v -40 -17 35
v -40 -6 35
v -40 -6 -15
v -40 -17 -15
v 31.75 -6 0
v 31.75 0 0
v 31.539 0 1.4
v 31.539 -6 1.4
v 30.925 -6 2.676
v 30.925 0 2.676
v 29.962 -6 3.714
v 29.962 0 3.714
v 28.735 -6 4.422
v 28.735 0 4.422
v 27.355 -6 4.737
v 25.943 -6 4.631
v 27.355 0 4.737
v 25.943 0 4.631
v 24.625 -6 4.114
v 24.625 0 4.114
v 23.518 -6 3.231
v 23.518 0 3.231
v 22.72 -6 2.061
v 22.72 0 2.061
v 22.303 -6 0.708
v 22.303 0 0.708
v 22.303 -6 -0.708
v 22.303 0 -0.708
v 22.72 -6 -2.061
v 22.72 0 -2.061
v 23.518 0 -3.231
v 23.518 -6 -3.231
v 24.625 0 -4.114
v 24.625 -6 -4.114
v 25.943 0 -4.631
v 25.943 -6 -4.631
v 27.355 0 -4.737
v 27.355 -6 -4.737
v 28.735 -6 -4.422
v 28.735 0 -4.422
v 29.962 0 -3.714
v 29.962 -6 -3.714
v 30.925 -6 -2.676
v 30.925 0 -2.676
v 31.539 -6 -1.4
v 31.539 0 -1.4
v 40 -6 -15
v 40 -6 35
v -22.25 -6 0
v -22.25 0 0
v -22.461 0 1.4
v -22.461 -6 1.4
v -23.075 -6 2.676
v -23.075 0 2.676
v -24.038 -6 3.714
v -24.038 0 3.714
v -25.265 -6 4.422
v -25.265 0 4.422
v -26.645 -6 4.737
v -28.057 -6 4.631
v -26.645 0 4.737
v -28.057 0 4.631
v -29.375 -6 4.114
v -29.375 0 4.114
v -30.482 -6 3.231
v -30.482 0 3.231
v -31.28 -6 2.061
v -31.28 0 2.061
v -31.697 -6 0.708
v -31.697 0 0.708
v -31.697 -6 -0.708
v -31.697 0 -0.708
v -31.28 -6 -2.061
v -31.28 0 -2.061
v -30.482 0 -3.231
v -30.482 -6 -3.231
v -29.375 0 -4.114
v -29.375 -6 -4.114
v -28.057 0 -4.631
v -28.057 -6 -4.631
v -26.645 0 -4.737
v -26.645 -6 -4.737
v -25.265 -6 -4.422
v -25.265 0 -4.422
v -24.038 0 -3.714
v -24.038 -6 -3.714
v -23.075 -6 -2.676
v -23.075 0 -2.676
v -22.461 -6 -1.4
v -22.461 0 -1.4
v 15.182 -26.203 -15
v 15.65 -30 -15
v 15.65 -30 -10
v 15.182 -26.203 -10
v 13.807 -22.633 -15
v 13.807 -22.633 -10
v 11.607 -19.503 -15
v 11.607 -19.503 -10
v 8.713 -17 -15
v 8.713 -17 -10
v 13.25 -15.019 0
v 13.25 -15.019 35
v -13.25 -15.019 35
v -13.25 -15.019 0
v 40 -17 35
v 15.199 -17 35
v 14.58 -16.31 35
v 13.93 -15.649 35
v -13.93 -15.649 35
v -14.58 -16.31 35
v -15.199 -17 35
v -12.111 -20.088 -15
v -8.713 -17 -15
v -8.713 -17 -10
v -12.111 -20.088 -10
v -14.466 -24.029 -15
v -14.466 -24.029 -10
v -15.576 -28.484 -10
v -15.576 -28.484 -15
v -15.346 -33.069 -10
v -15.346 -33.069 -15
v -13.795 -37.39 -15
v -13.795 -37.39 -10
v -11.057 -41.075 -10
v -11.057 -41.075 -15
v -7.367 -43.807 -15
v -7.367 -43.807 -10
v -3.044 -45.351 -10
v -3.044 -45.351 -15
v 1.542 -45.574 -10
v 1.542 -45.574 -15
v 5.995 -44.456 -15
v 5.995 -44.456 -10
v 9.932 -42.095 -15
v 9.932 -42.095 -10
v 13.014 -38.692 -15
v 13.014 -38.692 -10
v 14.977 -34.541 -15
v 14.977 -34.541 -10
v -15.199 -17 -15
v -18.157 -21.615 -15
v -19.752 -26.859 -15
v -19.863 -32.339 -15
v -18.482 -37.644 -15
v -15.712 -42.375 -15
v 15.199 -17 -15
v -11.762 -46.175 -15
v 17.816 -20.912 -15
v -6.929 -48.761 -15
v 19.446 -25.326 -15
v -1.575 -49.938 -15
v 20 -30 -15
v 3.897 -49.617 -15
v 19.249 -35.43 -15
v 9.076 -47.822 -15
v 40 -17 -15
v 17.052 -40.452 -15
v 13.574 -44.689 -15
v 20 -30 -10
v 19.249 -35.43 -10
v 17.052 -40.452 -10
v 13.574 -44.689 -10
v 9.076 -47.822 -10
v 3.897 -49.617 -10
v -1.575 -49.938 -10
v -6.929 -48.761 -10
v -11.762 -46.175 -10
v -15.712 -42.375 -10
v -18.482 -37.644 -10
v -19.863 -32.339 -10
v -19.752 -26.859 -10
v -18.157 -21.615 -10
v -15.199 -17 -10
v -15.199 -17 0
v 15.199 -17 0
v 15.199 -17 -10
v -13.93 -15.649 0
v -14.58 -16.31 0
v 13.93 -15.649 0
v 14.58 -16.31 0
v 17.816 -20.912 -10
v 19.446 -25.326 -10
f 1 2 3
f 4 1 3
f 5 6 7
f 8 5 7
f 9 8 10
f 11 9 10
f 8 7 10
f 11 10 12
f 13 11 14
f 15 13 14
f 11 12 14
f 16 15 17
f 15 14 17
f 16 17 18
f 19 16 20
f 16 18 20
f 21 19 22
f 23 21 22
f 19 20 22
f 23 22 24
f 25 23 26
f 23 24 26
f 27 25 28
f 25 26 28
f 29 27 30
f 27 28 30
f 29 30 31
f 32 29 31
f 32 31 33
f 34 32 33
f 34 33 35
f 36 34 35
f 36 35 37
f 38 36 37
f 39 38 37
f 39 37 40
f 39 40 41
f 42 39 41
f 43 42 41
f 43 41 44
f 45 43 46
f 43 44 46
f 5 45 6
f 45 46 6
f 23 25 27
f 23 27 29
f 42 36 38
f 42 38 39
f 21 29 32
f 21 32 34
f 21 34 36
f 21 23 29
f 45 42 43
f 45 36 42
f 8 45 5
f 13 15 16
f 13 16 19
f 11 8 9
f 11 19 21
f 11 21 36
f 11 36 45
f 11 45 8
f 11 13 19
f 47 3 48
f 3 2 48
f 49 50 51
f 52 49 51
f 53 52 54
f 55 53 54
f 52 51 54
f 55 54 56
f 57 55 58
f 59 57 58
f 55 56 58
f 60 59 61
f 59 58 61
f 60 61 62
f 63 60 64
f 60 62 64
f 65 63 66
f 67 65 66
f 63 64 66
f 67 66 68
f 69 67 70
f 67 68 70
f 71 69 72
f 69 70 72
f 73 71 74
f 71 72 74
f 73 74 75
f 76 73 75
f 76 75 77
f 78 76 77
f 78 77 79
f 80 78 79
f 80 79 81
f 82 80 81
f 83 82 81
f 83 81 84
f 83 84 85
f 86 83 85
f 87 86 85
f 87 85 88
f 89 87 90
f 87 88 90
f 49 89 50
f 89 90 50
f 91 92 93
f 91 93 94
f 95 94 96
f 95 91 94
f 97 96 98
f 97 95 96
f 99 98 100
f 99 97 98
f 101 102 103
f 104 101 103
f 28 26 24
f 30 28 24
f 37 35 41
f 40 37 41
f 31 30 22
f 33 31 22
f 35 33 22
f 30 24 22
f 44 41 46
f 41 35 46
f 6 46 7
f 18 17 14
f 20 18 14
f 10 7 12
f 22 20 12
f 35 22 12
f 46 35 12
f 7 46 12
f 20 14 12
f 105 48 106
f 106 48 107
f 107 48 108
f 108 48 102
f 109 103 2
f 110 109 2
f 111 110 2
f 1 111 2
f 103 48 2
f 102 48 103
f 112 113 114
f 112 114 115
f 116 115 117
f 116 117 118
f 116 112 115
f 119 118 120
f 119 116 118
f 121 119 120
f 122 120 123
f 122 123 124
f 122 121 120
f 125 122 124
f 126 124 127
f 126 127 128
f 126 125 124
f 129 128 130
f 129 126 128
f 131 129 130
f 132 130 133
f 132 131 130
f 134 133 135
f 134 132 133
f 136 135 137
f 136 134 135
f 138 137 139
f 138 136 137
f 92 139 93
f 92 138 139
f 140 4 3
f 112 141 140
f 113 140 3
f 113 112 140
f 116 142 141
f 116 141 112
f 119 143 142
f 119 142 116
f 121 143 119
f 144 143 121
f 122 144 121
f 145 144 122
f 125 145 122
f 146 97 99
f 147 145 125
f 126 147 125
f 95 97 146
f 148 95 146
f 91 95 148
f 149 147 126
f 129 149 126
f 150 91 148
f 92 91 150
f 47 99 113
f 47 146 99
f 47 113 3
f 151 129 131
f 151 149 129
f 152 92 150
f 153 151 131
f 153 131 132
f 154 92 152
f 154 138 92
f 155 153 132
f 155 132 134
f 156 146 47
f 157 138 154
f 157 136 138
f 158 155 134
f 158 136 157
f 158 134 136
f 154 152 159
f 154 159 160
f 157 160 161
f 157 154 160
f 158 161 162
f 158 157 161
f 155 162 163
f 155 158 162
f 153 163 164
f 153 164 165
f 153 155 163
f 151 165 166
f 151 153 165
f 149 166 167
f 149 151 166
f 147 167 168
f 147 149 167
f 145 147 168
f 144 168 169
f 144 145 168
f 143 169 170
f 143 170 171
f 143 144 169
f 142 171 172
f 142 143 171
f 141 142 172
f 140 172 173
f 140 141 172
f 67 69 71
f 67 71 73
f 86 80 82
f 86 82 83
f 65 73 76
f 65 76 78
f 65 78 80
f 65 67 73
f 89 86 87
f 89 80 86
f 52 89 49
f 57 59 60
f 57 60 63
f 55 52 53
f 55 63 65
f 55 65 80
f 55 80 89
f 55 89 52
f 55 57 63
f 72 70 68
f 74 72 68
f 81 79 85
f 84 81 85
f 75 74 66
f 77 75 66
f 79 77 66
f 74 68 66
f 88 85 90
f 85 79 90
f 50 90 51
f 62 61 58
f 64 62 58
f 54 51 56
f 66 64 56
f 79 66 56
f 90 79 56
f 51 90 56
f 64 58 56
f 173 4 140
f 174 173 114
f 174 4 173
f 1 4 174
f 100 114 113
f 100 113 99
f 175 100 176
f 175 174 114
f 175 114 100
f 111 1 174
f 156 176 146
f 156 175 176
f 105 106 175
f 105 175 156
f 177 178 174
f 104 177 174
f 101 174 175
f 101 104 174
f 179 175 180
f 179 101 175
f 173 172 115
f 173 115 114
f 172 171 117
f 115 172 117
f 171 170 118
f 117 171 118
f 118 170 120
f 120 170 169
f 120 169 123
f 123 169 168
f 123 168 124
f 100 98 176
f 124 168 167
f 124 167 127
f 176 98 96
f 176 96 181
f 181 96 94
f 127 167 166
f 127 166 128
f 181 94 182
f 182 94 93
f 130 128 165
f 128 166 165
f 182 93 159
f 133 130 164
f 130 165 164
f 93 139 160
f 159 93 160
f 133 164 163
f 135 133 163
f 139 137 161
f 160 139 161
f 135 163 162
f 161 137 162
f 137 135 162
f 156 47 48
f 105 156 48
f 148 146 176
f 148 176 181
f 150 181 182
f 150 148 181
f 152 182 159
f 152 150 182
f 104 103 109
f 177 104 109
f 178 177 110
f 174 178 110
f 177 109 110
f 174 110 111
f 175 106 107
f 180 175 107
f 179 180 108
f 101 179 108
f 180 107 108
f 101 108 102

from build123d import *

# Parameters (mm, degrees)
F0_R     = 4.75
F1_DEPTH = 6
F2_R     = 4.75
F3_DEPTH = 11
F5_DEPTH = 5
F7_DEPTH = 35


with BuildPart() as f1:
    # F0 (on Front) → F1 (new body)
    with BuildSketch(Plane.XZ):
        with Locations((-27, 0)):
            Circle(F0_R)
    extrude(amount=F1_DEPTH)


with BuildPart() as f1b:
    # F0 (on Front) → F1, piece 2 (new body)
    with BuildSketch(Plane.XZ):
        with Locations((27, 0)):
            Circle(F0_R)
    extrude(amount=F1_DEPTH)


with BuildPart() as f3:
    # F2 (on face) → F3 (new body)
    with BuildSketch(Plane.XZ.offset(6)):
        Polygon((-40, -15), (40, -15), (40, 15), (40, 35), (-40, 35), (-40, 15), align=None)
        with Locations((-27, 0)):
            Circle(F2_R, mode=Mode.SUBTRACT)
        with Locations((-27, 0)):
            Circle(F2_R)
    extrude(amount=F3_DEPTH)

    # F4 (on face) → F5 (join)
    with BuildSketch(Plane(origin=(0, 0, -15), x_dir=(1, 0, 0), z_dir=(0, 0, -1))):
        with BuildLine():
            ThreePointArc((-8.7133518235, 17), (-7.3674467749, 43.8073613706), (15.65, 30))
            ThreePointArc((15.65, 30), (13.8073613706, 22.6325532251), (8.7133518235, 17))
            Line((8.7133518235, 17), (15.1986841536, 17))
            ThreePointArc((15.1986841536, 17), (18.7613123618, 23.0708472044), (20, 30))
            ThreePointArc((20, 30), (-6.9291527956, 48.7613123618), (-15.1986841536, 17))
            Line((-15.1986841536, 17), (-8.7133518235, 17))
        make_face()
        with BuildLine():
            ThreePointArc((8.7133518235, 17), (0, 14.35), (-8.7133518235, 17))
            Line((-8.7133518235, 17), (-15.1986841536, 17))
            ThreePointArc((-15.1986841536, 17), (0, 10), (15.1986841536, 17))
            Line((15.1986841536, 17), (8.7133518235, 17))
        make_face()
    extrude(amount=-F5_DEPTH)

    # F6 (on face) → F7 (cut)
    with BuildSketch(Plane.XY.offset(35)):
        with BuildLine():
            ThreePointArc((-13.25, -15.0187617334), (-14.2587949626, -15.975494083), (-15.1986841536, -17))
            Line((-15.1986841536, -17), (-13.25, -17))
            Line((-13.25, -17), (-13.25, -15.0187617334))
        make_face()
        Polygon((8.7133518235, -17), (13.25, -17), (13.25, -15.0187617334), (-13.25, -15.0187617334), (-13.25, -17), (-8.7133518235, -17), align=None)
        with BuildLine():
            Line((13.25, -17), (15.1986841536, -17))
            ThreePointArc((15.1986841536, -17), (14.2587949626, -15.975494083), (13.25, -15.0187617334))
            Line((13.25, -15.0187617334), (13.25, -17))
        make_face()
    extrude(amount=-F7_DEPTH, mode=Mode.SUBTRACT)


solid = Compound([f1.part, f1b.part, f3.part])
